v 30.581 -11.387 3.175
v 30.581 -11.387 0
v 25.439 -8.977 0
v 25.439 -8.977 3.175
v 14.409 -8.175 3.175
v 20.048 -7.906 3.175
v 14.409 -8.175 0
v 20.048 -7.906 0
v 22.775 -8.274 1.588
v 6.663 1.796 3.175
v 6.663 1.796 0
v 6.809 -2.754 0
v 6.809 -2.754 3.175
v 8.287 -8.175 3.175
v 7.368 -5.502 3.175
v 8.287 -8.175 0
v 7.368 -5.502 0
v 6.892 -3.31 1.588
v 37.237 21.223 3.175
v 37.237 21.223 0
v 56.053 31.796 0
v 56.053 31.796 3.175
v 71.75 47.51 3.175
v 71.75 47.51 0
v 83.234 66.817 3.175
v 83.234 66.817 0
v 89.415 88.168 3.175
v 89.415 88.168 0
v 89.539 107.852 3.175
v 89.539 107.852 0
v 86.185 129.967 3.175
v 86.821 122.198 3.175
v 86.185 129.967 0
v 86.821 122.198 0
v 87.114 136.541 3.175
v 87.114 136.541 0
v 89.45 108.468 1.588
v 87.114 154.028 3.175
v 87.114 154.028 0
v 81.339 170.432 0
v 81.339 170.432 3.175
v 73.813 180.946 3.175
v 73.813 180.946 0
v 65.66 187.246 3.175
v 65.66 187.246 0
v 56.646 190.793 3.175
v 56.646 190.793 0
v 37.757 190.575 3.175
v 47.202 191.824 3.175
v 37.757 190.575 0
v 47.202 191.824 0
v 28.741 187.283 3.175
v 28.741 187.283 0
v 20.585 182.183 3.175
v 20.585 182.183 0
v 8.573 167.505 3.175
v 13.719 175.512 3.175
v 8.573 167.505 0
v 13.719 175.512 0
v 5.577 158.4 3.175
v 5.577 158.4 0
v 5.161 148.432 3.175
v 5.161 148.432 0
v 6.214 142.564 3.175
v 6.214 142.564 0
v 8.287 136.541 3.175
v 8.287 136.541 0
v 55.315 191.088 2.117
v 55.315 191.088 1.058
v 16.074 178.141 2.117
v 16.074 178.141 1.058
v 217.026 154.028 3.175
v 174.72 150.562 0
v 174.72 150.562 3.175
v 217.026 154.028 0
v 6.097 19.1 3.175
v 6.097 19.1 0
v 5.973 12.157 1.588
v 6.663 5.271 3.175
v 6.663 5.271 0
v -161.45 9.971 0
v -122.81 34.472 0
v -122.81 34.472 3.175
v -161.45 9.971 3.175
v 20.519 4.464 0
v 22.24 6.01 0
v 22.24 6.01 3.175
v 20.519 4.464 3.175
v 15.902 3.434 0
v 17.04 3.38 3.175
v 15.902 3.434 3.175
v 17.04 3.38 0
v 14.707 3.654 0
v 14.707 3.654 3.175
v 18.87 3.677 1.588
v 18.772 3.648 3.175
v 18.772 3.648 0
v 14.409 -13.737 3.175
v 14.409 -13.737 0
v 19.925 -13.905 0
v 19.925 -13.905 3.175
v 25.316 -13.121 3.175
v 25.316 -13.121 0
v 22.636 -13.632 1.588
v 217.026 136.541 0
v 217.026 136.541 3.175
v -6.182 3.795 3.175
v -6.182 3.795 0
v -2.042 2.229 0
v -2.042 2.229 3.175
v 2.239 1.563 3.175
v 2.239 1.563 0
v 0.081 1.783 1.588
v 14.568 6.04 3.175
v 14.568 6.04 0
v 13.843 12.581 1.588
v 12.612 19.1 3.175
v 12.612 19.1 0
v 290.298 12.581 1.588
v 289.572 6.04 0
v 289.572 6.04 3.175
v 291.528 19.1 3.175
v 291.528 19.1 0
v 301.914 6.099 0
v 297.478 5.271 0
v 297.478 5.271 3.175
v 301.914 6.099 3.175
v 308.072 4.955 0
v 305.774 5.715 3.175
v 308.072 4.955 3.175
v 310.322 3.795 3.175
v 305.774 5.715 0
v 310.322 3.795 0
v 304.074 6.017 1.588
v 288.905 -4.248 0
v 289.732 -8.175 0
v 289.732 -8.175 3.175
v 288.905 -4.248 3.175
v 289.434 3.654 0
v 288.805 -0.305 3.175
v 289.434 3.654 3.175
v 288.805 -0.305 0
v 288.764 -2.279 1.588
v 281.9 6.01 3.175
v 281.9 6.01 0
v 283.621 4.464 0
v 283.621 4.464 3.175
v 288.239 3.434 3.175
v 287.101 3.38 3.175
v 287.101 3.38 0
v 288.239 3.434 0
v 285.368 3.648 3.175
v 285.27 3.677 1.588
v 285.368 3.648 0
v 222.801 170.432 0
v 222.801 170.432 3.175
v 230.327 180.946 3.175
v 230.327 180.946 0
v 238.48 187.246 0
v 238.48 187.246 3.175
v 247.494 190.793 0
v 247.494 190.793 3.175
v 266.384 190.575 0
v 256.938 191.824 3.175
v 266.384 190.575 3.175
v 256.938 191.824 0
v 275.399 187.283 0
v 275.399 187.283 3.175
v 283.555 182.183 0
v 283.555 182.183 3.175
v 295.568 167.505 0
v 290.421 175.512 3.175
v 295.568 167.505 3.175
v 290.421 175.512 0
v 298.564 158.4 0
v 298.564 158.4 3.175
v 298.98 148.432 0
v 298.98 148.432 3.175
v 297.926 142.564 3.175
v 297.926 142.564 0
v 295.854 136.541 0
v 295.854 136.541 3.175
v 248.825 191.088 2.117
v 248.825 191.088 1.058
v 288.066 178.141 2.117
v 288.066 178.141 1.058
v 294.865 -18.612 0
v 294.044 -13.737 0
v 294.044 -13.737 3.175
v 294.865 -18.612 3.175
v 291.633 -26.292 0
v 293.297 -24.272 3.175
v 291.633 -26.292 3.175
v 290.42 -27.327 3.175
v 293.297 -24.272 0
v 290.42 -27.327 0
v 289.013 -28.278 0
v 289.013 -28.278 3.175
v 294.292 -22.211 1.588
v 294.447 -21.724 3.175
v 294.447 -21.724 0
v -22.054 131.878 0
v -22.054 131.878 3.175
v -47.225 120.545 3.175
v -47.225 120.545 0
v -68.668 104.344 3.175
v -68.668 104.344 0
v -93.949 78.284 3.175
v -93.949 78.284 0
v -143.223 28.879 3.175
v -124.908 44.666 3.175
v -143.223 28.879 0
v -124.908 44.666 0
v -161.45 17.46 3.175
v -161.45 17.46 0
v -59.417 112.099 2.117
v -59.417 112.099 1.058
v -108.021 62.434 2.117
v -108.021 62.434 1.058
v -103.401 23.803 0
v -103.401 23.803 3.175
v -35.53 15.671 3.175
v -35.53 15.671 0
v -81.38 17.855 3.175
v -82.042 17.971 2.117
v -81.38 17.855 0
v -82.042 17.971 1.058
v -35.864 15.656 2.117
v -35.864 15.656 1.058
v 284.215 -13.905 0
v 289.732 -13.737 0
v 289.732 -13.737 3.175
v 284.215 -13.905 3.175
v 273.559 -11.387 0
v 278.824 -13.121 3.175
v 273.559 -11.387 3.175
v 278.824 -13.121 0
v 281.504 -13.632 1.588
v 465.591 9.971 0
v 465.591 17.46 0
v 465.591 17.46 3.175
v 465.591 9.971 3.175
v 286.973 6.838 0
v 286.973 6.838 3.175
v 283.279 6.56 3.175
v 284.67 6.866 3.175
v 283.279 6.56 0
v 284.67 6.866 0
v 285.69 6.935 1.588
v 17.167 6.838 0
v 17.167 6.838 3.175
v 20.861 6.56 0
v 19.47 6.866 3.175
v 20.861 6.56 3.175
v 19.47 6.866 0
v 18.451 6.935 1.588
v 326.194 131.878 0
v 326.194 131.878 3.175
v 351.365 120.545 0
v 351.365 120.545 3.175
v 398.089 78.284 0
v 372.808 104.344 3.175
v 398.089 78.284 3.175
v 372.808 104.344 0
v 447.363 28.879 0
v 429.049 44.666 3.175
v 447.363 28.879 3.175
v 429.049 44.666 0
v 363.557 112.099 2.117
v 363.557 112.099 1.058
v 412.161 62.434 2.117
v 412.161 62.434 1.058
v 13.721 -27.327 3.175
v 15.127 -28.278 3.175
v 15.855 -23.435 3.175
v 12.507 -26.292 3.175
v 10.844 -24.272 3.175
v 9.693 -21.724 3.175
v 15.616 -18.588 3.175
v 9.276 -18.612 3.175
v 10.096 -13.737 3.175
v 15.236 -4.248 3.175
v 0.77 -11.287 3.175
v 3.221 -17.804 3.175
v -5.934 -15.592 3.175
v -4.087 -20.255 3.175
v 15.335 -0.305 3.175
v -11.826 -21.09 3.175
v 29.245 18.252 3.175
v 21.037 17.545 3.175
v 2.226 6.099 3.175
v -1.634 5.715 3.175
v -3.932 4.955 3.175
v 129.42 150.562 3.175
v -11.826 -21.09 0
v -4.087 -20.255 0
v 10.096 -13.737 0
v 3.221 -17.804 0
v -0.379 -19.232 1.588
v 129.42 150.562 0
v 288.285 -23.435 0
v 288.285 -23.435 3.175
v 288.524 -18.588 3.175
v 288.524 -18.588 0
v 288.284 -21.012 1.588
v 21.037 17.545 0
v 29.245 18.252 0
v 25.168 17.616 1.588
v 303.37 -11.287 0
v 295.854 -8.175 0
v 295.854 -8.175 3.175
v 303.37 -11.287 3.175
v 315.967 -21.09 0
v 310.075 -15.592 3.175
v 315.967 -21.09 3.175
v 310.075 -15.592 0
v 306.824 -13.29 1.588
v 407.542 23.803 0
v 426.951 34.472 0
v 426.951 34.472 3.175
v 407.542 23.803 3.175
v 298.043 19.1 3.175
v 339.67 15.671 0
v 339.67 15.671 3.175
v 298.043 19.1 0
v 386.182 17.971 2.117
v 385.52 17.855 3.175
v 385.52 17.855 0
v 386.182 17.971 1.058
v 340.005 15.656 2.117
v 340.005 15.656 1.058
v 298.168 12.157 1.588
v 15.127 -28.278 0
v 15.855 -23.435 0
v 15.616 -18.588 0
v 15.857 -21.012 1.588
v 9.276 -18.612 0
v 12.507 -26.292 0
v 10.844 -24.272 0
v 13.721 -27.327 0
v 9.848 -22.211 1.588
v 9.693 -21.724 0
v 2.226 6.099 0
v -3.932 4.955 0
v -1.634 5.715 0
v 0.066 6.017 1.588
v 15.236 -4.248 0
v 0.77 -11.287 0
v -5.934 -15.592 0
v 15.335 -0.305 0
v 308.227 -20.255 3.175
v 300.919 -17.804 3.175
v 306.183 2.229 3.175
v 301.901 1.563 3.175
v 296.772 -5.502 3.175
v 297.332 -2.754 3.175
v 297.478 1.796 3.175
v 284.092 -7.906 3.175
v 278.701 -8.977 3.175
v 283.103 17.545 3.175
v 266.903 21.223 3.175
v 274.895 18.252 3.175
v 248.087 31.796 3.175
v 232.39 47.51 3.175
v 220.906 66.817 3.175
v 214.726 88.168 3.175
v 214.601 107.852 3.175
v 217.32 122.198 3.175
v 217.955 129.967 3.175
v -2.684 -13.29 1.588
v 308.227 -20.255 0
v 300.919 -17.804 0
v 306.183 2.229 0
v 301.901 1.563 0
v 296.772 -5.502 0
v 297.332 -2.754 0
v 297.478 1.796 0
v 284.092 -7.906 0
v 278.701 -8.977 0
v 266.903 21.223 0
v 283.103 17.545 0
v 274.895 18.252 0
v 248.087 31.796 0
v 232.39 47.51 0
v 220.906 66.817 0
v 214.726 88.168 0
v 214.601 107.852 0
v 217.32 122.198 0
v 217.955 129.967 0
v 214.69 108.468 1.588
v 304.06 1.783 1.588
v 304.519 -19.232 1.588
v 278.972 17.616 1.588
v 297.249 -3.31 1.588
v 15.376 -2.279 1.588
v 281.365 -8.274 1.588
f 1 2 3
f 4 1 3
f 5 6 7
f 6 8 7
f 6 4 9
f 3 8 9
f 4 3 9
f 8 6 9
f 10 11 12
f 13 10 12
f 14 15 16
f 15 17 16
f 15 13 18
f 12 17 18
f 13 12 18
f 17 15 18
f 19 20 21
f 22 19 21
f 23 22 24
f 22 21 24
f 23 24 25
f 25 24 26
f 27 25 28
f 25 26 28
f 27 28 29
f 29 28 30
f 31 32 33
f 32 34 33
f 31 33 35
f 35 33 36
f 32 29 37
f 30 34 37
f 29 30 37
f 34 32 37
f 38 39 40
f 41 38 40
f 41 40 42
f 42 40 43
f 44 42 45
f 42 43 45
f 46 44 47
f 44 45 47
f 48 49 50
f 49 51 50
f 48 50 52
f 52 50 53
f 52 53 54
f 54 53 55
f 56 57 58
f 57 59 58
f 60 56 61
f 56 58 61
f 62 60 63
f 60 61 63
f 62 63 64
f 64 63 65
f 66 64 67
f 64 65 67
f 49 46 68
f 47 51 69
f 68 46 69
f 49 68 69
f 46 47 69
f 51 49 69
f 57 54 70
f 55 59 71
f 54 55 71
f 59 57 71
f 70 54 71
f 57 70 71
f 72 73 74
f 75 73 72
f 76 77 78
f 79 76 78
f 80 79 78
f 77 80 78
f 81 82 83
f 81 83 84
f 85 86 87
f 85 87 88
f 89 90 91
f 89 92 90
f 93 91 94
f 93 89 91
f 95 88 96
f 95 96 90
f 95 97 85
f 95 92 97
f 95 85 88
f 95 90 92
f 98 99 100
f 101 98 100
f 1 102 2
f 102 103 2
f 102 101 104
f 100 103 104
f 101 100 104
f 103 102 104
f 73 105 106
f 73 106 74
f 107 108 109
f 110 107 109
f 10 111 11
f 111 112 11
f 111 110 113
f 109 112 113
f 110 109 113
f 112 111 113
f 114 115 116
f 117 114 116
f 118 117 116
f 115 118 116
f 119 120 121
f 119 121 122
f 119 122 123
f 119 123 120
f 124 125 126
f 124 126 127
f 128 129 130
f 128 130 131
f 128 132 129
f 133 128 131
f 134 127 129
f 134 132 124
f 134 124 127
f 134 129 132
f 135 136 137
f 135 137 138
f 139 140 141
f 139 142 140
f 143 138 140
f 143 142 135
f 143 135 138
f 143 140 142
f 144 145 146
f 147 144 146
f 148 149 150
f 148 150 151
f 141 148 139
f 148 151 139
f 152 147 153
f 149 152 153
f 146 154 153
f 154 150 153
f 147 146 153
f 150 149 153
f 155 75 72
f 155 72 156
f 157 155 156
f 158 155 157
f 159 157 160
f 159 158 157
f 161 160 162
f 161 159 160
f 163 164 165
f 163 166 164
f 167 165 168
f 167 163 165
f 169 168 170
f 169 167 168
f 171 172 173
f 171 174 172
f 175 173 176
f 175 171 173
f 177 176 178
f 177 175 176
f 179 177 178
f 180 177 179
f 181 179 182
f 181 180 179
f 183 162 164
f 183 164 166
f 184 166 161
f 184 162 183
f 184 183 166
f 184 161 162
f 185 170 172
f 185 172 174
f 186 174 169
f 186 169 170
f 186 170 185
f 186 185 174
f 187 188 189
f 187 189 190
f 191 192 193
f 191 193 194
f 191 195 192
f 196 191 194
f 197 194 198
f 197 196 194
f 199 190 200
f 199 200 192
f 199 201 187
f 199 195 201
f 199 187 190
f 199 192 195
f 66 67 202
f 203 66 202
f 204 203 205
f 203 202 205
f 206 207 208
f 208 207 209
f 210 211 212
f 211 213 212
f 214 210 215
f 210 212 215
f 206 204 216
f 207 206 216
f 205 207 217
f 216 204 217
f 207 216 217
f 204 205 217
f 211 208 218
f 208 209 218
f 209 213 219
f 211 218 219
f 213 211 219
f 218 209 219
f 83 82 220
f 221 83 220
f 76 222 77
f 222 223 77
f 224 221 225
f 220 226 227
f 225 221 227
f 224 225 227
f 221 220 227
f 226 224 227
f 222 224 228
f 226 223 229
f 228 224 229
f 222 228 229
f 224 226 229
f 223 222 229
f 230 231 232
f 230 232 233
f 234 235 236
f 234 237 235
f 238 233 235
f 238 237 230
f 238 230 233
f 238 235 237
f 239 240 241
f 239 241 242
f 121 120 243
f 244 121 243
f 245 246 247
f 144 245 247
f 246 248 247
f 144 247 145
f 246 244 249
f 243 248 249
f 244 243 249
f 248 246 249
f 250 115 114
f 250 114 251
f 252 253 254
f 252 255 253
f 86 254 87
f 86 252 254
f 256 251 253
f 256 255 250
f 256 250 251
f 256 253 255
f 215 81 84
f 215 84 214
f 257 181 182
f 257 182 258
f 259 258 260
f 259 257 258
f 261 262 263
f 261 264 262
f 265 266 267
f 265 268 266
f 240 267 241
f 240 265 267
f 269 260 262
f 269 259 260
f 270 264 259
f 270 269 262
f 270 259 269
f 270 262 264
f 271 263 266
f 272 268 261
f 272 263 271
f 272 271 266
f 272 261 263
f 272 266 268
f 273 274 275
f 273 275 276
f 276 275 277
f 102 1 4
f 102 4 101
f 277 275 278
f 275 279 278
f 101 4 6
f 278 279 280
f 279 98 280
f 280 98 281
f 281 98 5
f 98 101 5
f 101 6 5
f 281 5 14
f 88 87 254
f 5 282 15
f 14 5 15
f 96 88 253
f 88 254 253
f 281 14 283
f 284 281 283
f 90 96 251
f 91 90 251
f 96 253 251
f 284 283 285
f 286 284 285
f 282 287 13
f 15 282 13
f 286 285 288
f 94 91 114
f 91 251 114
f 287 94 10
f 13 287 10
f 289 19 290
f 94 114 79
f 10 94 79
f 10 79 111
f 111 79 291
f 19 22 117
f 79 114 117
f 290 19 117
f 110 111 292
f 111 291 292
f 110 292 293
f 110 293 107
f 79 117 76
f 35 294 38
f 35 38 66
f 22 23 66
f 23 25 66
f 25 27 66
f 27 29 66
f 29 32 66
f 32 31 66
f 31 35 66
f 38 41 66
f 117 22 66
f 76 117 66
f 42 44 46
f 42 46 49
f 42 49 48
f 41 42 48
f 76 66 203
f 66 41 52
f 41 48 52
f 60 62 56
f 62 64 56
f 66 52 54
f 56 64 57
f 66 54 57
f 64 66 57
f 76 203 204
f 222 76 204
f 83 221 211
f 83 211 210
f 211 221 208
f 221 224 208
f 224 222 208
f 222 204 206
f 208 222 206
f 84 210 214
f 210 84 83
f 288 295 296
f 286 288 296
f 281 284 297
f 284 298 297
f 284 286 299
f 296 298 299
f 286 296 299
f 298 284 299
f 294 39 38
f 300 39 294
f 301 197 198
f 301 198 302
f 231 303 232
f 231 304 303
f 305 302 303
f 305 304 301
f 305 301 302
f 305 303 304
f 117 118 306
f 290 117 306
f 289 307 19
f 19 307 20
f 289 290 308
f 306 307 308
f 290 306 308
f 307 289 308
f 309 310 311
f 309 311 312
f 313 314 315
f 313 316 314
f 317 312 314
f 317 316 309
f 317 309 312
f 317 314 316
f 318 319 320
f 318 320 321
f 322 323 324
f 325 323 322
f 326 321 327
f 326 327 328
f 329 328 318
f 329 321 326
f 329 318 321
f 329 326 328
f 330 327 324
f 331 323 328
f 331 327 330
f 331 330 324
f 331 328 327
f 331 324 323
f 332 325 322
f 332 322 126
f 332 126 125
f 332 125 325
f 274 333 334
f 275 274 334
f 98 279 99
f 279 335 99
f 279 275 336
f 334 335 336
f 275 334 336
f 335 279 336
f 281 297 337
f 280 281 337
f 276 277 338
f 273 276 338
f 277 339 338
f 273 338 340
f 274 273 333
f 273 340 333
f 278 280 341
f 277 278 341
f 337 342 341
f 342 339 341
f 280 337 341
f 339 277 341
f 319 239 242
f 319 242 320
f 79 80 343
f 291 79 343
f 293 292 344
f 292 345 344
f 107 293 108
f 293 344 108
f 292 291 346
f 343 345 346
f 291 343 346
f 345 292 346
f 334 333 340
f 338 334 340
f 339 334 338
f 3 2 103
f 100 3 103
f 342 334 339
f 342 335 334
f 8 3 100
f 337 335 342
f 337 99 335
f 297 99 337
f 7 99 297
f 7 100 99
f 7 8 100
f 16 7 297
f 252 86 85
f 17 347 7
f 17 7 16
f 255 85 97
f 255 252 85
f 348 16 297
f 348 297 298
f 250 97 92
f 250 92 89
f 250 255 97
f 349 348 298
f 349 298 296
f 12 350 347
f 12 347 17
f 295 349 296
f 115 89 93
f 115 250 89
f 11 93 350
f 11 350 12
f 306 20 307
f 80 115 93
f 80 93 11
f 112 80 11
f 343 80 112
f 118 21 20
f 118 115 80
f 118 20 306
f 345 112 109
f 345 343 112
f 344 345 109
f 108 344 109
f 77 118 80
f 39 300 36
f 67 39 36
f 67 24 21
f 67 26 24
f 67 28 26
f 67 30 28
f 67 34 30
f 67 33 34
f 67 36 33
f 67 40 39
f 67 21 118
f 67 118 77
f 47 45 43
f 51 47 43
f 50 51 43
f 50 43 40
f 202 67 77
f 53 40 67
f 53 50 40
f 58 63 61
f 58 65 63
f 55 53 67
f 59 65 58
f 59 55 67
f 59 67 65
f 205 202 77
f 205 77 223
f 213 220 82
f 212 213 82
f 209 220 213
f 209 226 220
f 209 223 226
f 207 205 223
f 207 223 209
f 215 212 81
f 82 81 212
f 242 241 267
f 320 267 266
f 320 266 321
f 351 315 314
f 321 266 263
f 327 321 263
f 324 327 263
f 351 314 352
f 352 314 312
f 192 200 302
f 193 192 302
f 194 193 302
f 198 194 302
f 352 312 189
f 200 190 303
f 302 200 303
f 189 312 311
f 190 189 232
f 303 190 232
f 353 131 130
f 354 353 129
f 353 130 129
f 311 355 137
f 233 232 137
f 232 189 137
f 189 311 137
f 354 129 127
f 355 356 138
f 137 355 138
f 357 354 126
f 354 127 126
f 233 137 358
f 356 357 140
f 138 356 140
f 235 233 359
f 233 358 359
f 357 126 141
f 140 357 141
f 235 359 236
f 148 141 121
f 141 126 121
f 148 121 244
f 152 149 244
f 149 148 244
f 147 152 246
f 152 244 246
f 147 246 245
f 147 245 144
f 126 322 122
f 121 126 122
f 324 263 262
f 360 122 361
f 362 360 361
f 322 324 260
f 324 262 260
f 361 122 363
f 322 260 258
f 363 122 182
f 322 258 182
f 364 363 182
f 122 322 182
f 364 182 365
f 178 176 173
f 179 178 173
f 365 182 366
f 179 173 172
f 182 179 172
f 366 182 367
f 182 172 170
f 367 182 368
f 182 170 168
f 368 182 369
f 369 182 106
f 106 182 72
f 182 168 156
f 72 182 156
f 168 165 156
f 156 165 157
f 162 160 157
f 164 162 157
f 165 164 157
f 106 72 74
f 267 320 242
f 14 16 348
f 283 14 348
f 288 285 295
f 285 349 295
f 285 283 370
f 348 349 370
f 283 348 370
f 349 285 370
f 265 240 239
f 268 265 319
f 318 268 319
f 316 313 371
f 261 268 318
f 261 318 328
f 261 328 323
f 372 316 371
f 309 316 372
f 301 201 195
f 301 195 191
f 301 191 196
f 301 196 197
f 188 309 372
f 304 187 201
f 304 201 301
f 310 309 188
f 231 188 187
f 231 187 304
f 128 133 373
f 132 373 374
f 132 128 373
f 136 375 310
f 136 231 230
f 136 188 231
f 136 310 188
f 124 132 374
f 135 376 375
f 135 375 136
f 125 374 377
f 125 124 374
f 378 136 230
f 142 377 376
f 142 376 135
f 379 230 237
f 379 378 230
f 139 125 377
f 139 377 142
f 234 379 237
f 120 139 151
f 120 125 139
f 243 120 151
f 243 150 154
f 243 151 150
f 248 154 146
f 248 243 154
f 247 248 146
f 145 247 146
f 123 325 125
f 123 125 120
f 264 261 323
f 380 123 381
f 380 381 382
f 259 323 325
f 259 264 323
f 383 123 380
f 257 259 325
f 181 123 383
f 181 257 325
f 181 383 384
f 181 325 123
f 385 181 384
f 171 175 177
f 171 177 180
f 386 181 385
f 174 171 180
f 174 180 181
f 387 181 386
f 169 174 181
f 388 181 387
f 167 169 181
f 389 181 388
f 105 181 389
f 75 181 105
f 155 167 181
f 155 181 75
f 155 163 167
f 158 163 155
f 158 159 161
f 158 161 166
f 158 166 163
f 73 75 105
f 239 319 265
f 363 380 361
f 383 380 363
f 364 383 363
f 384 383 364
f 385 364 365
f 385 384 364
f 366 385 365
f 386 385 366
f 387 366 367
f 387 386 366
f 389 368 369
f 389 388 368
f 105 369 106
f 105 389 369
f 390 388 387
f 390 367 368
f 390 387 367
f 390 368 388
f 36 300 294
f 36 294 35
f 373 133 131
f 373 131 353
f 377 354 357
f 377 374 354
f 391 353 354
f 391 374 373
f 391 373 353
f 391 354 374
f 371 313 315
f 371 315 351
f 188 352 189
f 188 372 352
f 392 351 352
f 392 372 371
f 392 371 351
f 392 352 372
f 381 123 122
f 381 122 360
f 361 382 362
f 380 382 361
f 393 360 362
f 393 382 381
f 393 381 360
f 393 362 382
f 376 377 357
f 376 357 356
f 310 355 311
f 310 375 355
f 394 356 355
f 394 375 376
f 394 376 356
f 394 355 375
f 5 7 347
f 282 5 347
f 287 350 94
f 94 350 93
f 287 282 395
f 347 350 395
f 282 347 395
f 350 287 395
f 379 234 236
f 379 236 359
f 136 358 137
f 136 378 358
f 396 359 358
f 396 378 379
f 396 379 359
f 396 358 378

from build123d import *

# Parameters (mm, degrees)
BOSS_EXTRUDE1_DEPTH   = 3.175
BOSS_EXTRUDE1_2_DEPTH = 3.175


with BuildPart() as part:
    # Sketch1 → Boss-Extrude1 (new body)
    with BuildSketch(Plane.XY):
        with BuildLine():
            Line((87.113919375, 154.027891238), (129.420352067, 150.562076769))
            Line((129.420352067, 150.562076769), (87.113919375, 136.540935247))
            add(Edge.make_bspline(
                [(37.237390471, 21.222876939), (70.113078244, 33.521092704), (101.331207371, 83.359211821), (84.503522649, 127.088417674), (87.113919375, 136.540935247)],
                knots=[0, 0, 0, 0, 0.790173508, 1, 1, 1, 1], degree=3))
            add(Edge.make_bspline(
                [(12.61174712, 19.099962546), (25.411659158, 15.070057004), (37.237390471, 21.222876939)],
                knots=[0, 0, 0, 1, 1, 1], degree=2))
            add(Edge.make_bspline(
                [(14.568109931, 6.0395201), (14.095506124, 12.591987305), (12.61174712, 19.099962546)],
                knots=[0.519389879, 0.519389879, 0.519389879, 1, 1, 1], degree=2))
            add(Edge.make_bspline(
                [(14.568109931, 6.0395201), (18.497169183, 7.844495738), (22.239776513, 6.009689266)],
                knots=[0, 0, 0, 1, 1, 1], degree=2))
            add(Edge.make_bspline(
                [(22.239776513, 6.009689266), (19.267647268, 2.52301559), (14.706588007, 3.654225883)],
                knots=[0, 0, 0, 1, 1, 1], degree=2))
            add(Edge.make_bspline(
                [(14.40866916, -8.174794729), (16.194892919, -2.297522761), (14.706588007, 3.654225883)],
                knots=[0, 0, 0, 1, 1, 1], degree=2))
            add(Edge.make_bspline(
                [(30.580967513, -11.386655468), (23.054859283, -6.767777046), (14.40866916, -8.174794729)],
                knots=[0, 0, 0, 1, 1, 1], degree=2))
            add(Edge.make_bspline(
                [(14.40866916, -13.736774366), (22.777620592, -14.702134943), (30.580967513, -11.386655468)],
                knots=[0, 0, 0, 1, 1, 1], degree=2))
            add(Edge.make_bspline(
                [(15.127437975, -28.277722637), (16.94512335, -21.015961132), (14.40866916, -13.736774366)],
                knots=[0, 0, 0, 1, 1, 1], degree=2))
            add(Edge.make_bspline(
                [(10.096056265, -13.736774366), (7.084149985, -23.415624205), (15.127437975, -28.277722637)],
                knots=[0, 0, 0, 1, 1, 1], degree=2))
            add(Edge.make_bspline(
                [(-11.826392613, -21.09003448), (0.107623037, -21.050157795), (10.096056265, -13.736774366)],
                knots=[0, 0, 0, 1, 1, 1], degree=2))
            add(Edge.make_bspline(
                [(8.286691916, -8.174794729), (-3.597506393, -11.947847819), (-11.826392613, -21.09003448)],
                knots=[0, 0, 0, 1, 1, 1], degree=2))
            add(Edge.make_bspline(
                [(6.662637903, 1.795930355), (6.308690545, -3.429784383), (8.286691916, -8.174794729)],
                knots=[0, 0, 0, 1, 1, 1], degree=2))
            add(Edge.make_bspline(
                [(-6.182152926, 3.795070158), (-0.078965126, 0.770932331), (6.662637903, 1.795930355)],
                knots=[0, 0, 0, 1, 1, 1], degree=2))
            add(Edge.make_bspline(
                [(6.662637903, 5.271482897), (-0.10810119, 7.501609225), (-6.182152926, 3.795070158)],
                knots=[0, 0, 0, 1, 1, 1], degree=2))
            add(Edge.make_bspline(
                [(6.097375444, 19.099962546), (5.565064553, 12.127998482), (6.662637903, 5.271482897)],
                knots=[0, 0, 0, 1, 1, 1], degree=2))
            add(Edge.make_bspline(
                [(-122.81044511, 34.471930675), (-87.954170711, 8.06822127), (-30.548617864, 15.586902078), (6.097375444, 19.099962546)],
                knots=[0, 0, 0, 0, 1, 1, 1, 1], degree=3))
            Line((-122.81044511, 34.471930675), (-161.450370656, 9.970725084))
            Line((-161.450370656, 9.970725084), (-161.450370656, 17.460429913))
            add(Edge.make_bspline(
                [(8.286691916, 136.540935247), (-76.942196875, 134.682911592), (-97.632880087, 50.116389354), (-161.450370656, 17.460429913)],
                knots=[0, 0, 0, 0, 1, 1, 1, 1], degree=3))
            add(Edge.make_bspline(
                [(87.113919375, 154.027891238), (71.999941775, 223.210938824), (-12.616412859, 185.34808031), (8.286691916, 136.540935247)],
                knots=[0, 0, 0, 0, 1, 1, 1, 1], degree=3))
        make_face()
    extrude(amount=BOSS_EXTRUDE1_DEPTH)


with BuildPart() as body_2:
    # Sketch1 → Boss-Extrude1 2 (new body)
    with BuildSketch(Plane.XY):
        with BuildLine():
            Line((465.590603009, 9.970725084), (426.950677463, 34.471930675))
            add(Edge.make_bspline(
                [(426.950677463, 34.471930675), (392.094403064, 8.06822127), (334.688850216, 15.586902078), (298.042856909, 19.099962546)],
                knots=[0, 0, 0, 0, 1, 1, 1, 1], degree=3))
            add(Edge.make_bspline(
                [(298.042856909, 19.099962546), (298.5751678, 12.127998482), (297.47759445, 5.271482897)],
                knots=[0, 0, 0, 1, 1, 1], degree=2))
            add(Edge.make_bspline(
                [(297.47759445, 5.271482897), (304.248333543, 7.501609225), (310.322385279, 3.795070158)],
                knots=[0, 0, 0, 1, 1, 1], degree=2))
            add(Edge.make_bspline(
                [(310.322385279, 3.795070158), (304.219197479, 0.770932331), (297.47759445, 1.795930355)],
                knots=[0, 0, 0, 1, 1, 1], degree=2))
            add(Edge.make_bspline(
                [(297.47759445, 1.795930355), (297.831541808, -3.429784383), (295.853540437, -8.174794729)],
                knots=[0, 0, 0, 1, 1, 1], degree=2))
            add(Edge.make_bspline(
                [(295.853540437, -8.174794729), (307.737738746, -11.947847819), (315.966624966, -21.09003448)],
                knots=[0, 0, 0, 1, 1, 1], degree=2))
            add(Edge.make_bspline(
                [(315.966624966, -21.09003448), (304.032609316, -21.050157795), (294.044176087, -13.736774366)],
                knots=[0, 0, 0, 1, 1, 1], degree=2))
            add(Edge.make_bspline(
                [(294.044176087, -13.736774366), (297.056082368, -23.415624205), (289.012794378, -28.277722637)],
                knots=[0, 0, 0, 1, 1, 1], degree=2))
            add(Edge.make_bspline(
                [(289.012794378, -28.277722637), (287.195109003, -21.015961132), (289.731563193, -13.736774366)],
                knots=[0, 0, 0, 1, 1, 1], degree=2))
            add(Edge.make_bspline(
                [(289.731563193, -13.736774366), (281.362611761, -14.702134943), (273.55926484, -11.386655468)],
                knots=[0, 0, 0, 1, 1, 1], degree=2))
            add(Edge.make_bspline(
                [(273.55926484, -11.386655468), (281.085373069, -6.767777046), (289.731563193, -8.174794729)],
                knots=[0, 0, 0, 1, 1, 1], degree=2))
            add(Edge.make_bspline(
                [(289.731563193, -8.174794729), (287.945339433, -2.297522761), (289.433644346, 3.654225883)],
                knots=[0, 0, 0, 1, 1, 1], degree=2))
            add(Edge.make_bspline(
                [(281.90045584, 6.009689266), (284.872585085, 2.52301559), (289.433644346, 3.654225883)],
                knots=[0, 0, 0, 1, 1, 1], degree=2))
            add(Edge.make_bspline(
                [(289.572122421, 6.0395201), (285.64306317, 7.844495738), (281.90045584, 6.009689266)],
                knots=[0, 0, 0, 1, 1, 1], degree=2))
            add(Edge.make_bspline(
                [(289.572122421, 6.0395201), (290.044726229, 12.591987305), (291.528485233, 19.099962546)],
                knots=[0.519389879, 0.519389879, 0.519389879, 1, 1, 1], degree=2))
            add(Edge.make_bspline(
                [(291.528485233, 19.099962546), (278.728573195, 15.070057004), (266.902841882, 21.222876939)],
                knots=[0, 0, 0, 1, 1, 1], degree=2))
            add(Edge.make_bspline(
                [(266.902841882, 21.222876939), (234.027154109, 33.521092704), (202.809024982, 83.359211821), (219.636709704, 127.088417674), (217.026312977, 136.540935247)],
                knots=[0, 0, 0, 0, 0.790173508, 1, 1, 1, 1], degree=3))
            Line((217.026312977, 136.540935247), (174.719880286, 150.562076769))
            Line((174.719880286, 150.562076769), (217.026312977, 154.027891238))
            add(Edge.make_bspline(
                [(217.026312977, 154.027891238), (232.140290578, 223.210938824), (316.756645212, 185.34808031), (295.853540437, 136.540935247)],
                knots=[0, 0, 0, 0, 1, 1, 1, 1], degree=3))
            add(Edge.make_bspline(
                [(295.853540437, 136.540935247), (381.082429227, 134.682911592), (401.77311244, 50.116389354), (465.590603009, 17.460429913)],
                knots=[0, 0, 0, 0, 1, 1, 1, 1], degree=3))
            Line((465.590603009, 17.460429913), (465.590603009, 9.970725084))
        make_face()
    extrude(amount=BOSS_EXTRUDE1_2_DEPTH)


solid = Compound([part.part, body_2.part])
